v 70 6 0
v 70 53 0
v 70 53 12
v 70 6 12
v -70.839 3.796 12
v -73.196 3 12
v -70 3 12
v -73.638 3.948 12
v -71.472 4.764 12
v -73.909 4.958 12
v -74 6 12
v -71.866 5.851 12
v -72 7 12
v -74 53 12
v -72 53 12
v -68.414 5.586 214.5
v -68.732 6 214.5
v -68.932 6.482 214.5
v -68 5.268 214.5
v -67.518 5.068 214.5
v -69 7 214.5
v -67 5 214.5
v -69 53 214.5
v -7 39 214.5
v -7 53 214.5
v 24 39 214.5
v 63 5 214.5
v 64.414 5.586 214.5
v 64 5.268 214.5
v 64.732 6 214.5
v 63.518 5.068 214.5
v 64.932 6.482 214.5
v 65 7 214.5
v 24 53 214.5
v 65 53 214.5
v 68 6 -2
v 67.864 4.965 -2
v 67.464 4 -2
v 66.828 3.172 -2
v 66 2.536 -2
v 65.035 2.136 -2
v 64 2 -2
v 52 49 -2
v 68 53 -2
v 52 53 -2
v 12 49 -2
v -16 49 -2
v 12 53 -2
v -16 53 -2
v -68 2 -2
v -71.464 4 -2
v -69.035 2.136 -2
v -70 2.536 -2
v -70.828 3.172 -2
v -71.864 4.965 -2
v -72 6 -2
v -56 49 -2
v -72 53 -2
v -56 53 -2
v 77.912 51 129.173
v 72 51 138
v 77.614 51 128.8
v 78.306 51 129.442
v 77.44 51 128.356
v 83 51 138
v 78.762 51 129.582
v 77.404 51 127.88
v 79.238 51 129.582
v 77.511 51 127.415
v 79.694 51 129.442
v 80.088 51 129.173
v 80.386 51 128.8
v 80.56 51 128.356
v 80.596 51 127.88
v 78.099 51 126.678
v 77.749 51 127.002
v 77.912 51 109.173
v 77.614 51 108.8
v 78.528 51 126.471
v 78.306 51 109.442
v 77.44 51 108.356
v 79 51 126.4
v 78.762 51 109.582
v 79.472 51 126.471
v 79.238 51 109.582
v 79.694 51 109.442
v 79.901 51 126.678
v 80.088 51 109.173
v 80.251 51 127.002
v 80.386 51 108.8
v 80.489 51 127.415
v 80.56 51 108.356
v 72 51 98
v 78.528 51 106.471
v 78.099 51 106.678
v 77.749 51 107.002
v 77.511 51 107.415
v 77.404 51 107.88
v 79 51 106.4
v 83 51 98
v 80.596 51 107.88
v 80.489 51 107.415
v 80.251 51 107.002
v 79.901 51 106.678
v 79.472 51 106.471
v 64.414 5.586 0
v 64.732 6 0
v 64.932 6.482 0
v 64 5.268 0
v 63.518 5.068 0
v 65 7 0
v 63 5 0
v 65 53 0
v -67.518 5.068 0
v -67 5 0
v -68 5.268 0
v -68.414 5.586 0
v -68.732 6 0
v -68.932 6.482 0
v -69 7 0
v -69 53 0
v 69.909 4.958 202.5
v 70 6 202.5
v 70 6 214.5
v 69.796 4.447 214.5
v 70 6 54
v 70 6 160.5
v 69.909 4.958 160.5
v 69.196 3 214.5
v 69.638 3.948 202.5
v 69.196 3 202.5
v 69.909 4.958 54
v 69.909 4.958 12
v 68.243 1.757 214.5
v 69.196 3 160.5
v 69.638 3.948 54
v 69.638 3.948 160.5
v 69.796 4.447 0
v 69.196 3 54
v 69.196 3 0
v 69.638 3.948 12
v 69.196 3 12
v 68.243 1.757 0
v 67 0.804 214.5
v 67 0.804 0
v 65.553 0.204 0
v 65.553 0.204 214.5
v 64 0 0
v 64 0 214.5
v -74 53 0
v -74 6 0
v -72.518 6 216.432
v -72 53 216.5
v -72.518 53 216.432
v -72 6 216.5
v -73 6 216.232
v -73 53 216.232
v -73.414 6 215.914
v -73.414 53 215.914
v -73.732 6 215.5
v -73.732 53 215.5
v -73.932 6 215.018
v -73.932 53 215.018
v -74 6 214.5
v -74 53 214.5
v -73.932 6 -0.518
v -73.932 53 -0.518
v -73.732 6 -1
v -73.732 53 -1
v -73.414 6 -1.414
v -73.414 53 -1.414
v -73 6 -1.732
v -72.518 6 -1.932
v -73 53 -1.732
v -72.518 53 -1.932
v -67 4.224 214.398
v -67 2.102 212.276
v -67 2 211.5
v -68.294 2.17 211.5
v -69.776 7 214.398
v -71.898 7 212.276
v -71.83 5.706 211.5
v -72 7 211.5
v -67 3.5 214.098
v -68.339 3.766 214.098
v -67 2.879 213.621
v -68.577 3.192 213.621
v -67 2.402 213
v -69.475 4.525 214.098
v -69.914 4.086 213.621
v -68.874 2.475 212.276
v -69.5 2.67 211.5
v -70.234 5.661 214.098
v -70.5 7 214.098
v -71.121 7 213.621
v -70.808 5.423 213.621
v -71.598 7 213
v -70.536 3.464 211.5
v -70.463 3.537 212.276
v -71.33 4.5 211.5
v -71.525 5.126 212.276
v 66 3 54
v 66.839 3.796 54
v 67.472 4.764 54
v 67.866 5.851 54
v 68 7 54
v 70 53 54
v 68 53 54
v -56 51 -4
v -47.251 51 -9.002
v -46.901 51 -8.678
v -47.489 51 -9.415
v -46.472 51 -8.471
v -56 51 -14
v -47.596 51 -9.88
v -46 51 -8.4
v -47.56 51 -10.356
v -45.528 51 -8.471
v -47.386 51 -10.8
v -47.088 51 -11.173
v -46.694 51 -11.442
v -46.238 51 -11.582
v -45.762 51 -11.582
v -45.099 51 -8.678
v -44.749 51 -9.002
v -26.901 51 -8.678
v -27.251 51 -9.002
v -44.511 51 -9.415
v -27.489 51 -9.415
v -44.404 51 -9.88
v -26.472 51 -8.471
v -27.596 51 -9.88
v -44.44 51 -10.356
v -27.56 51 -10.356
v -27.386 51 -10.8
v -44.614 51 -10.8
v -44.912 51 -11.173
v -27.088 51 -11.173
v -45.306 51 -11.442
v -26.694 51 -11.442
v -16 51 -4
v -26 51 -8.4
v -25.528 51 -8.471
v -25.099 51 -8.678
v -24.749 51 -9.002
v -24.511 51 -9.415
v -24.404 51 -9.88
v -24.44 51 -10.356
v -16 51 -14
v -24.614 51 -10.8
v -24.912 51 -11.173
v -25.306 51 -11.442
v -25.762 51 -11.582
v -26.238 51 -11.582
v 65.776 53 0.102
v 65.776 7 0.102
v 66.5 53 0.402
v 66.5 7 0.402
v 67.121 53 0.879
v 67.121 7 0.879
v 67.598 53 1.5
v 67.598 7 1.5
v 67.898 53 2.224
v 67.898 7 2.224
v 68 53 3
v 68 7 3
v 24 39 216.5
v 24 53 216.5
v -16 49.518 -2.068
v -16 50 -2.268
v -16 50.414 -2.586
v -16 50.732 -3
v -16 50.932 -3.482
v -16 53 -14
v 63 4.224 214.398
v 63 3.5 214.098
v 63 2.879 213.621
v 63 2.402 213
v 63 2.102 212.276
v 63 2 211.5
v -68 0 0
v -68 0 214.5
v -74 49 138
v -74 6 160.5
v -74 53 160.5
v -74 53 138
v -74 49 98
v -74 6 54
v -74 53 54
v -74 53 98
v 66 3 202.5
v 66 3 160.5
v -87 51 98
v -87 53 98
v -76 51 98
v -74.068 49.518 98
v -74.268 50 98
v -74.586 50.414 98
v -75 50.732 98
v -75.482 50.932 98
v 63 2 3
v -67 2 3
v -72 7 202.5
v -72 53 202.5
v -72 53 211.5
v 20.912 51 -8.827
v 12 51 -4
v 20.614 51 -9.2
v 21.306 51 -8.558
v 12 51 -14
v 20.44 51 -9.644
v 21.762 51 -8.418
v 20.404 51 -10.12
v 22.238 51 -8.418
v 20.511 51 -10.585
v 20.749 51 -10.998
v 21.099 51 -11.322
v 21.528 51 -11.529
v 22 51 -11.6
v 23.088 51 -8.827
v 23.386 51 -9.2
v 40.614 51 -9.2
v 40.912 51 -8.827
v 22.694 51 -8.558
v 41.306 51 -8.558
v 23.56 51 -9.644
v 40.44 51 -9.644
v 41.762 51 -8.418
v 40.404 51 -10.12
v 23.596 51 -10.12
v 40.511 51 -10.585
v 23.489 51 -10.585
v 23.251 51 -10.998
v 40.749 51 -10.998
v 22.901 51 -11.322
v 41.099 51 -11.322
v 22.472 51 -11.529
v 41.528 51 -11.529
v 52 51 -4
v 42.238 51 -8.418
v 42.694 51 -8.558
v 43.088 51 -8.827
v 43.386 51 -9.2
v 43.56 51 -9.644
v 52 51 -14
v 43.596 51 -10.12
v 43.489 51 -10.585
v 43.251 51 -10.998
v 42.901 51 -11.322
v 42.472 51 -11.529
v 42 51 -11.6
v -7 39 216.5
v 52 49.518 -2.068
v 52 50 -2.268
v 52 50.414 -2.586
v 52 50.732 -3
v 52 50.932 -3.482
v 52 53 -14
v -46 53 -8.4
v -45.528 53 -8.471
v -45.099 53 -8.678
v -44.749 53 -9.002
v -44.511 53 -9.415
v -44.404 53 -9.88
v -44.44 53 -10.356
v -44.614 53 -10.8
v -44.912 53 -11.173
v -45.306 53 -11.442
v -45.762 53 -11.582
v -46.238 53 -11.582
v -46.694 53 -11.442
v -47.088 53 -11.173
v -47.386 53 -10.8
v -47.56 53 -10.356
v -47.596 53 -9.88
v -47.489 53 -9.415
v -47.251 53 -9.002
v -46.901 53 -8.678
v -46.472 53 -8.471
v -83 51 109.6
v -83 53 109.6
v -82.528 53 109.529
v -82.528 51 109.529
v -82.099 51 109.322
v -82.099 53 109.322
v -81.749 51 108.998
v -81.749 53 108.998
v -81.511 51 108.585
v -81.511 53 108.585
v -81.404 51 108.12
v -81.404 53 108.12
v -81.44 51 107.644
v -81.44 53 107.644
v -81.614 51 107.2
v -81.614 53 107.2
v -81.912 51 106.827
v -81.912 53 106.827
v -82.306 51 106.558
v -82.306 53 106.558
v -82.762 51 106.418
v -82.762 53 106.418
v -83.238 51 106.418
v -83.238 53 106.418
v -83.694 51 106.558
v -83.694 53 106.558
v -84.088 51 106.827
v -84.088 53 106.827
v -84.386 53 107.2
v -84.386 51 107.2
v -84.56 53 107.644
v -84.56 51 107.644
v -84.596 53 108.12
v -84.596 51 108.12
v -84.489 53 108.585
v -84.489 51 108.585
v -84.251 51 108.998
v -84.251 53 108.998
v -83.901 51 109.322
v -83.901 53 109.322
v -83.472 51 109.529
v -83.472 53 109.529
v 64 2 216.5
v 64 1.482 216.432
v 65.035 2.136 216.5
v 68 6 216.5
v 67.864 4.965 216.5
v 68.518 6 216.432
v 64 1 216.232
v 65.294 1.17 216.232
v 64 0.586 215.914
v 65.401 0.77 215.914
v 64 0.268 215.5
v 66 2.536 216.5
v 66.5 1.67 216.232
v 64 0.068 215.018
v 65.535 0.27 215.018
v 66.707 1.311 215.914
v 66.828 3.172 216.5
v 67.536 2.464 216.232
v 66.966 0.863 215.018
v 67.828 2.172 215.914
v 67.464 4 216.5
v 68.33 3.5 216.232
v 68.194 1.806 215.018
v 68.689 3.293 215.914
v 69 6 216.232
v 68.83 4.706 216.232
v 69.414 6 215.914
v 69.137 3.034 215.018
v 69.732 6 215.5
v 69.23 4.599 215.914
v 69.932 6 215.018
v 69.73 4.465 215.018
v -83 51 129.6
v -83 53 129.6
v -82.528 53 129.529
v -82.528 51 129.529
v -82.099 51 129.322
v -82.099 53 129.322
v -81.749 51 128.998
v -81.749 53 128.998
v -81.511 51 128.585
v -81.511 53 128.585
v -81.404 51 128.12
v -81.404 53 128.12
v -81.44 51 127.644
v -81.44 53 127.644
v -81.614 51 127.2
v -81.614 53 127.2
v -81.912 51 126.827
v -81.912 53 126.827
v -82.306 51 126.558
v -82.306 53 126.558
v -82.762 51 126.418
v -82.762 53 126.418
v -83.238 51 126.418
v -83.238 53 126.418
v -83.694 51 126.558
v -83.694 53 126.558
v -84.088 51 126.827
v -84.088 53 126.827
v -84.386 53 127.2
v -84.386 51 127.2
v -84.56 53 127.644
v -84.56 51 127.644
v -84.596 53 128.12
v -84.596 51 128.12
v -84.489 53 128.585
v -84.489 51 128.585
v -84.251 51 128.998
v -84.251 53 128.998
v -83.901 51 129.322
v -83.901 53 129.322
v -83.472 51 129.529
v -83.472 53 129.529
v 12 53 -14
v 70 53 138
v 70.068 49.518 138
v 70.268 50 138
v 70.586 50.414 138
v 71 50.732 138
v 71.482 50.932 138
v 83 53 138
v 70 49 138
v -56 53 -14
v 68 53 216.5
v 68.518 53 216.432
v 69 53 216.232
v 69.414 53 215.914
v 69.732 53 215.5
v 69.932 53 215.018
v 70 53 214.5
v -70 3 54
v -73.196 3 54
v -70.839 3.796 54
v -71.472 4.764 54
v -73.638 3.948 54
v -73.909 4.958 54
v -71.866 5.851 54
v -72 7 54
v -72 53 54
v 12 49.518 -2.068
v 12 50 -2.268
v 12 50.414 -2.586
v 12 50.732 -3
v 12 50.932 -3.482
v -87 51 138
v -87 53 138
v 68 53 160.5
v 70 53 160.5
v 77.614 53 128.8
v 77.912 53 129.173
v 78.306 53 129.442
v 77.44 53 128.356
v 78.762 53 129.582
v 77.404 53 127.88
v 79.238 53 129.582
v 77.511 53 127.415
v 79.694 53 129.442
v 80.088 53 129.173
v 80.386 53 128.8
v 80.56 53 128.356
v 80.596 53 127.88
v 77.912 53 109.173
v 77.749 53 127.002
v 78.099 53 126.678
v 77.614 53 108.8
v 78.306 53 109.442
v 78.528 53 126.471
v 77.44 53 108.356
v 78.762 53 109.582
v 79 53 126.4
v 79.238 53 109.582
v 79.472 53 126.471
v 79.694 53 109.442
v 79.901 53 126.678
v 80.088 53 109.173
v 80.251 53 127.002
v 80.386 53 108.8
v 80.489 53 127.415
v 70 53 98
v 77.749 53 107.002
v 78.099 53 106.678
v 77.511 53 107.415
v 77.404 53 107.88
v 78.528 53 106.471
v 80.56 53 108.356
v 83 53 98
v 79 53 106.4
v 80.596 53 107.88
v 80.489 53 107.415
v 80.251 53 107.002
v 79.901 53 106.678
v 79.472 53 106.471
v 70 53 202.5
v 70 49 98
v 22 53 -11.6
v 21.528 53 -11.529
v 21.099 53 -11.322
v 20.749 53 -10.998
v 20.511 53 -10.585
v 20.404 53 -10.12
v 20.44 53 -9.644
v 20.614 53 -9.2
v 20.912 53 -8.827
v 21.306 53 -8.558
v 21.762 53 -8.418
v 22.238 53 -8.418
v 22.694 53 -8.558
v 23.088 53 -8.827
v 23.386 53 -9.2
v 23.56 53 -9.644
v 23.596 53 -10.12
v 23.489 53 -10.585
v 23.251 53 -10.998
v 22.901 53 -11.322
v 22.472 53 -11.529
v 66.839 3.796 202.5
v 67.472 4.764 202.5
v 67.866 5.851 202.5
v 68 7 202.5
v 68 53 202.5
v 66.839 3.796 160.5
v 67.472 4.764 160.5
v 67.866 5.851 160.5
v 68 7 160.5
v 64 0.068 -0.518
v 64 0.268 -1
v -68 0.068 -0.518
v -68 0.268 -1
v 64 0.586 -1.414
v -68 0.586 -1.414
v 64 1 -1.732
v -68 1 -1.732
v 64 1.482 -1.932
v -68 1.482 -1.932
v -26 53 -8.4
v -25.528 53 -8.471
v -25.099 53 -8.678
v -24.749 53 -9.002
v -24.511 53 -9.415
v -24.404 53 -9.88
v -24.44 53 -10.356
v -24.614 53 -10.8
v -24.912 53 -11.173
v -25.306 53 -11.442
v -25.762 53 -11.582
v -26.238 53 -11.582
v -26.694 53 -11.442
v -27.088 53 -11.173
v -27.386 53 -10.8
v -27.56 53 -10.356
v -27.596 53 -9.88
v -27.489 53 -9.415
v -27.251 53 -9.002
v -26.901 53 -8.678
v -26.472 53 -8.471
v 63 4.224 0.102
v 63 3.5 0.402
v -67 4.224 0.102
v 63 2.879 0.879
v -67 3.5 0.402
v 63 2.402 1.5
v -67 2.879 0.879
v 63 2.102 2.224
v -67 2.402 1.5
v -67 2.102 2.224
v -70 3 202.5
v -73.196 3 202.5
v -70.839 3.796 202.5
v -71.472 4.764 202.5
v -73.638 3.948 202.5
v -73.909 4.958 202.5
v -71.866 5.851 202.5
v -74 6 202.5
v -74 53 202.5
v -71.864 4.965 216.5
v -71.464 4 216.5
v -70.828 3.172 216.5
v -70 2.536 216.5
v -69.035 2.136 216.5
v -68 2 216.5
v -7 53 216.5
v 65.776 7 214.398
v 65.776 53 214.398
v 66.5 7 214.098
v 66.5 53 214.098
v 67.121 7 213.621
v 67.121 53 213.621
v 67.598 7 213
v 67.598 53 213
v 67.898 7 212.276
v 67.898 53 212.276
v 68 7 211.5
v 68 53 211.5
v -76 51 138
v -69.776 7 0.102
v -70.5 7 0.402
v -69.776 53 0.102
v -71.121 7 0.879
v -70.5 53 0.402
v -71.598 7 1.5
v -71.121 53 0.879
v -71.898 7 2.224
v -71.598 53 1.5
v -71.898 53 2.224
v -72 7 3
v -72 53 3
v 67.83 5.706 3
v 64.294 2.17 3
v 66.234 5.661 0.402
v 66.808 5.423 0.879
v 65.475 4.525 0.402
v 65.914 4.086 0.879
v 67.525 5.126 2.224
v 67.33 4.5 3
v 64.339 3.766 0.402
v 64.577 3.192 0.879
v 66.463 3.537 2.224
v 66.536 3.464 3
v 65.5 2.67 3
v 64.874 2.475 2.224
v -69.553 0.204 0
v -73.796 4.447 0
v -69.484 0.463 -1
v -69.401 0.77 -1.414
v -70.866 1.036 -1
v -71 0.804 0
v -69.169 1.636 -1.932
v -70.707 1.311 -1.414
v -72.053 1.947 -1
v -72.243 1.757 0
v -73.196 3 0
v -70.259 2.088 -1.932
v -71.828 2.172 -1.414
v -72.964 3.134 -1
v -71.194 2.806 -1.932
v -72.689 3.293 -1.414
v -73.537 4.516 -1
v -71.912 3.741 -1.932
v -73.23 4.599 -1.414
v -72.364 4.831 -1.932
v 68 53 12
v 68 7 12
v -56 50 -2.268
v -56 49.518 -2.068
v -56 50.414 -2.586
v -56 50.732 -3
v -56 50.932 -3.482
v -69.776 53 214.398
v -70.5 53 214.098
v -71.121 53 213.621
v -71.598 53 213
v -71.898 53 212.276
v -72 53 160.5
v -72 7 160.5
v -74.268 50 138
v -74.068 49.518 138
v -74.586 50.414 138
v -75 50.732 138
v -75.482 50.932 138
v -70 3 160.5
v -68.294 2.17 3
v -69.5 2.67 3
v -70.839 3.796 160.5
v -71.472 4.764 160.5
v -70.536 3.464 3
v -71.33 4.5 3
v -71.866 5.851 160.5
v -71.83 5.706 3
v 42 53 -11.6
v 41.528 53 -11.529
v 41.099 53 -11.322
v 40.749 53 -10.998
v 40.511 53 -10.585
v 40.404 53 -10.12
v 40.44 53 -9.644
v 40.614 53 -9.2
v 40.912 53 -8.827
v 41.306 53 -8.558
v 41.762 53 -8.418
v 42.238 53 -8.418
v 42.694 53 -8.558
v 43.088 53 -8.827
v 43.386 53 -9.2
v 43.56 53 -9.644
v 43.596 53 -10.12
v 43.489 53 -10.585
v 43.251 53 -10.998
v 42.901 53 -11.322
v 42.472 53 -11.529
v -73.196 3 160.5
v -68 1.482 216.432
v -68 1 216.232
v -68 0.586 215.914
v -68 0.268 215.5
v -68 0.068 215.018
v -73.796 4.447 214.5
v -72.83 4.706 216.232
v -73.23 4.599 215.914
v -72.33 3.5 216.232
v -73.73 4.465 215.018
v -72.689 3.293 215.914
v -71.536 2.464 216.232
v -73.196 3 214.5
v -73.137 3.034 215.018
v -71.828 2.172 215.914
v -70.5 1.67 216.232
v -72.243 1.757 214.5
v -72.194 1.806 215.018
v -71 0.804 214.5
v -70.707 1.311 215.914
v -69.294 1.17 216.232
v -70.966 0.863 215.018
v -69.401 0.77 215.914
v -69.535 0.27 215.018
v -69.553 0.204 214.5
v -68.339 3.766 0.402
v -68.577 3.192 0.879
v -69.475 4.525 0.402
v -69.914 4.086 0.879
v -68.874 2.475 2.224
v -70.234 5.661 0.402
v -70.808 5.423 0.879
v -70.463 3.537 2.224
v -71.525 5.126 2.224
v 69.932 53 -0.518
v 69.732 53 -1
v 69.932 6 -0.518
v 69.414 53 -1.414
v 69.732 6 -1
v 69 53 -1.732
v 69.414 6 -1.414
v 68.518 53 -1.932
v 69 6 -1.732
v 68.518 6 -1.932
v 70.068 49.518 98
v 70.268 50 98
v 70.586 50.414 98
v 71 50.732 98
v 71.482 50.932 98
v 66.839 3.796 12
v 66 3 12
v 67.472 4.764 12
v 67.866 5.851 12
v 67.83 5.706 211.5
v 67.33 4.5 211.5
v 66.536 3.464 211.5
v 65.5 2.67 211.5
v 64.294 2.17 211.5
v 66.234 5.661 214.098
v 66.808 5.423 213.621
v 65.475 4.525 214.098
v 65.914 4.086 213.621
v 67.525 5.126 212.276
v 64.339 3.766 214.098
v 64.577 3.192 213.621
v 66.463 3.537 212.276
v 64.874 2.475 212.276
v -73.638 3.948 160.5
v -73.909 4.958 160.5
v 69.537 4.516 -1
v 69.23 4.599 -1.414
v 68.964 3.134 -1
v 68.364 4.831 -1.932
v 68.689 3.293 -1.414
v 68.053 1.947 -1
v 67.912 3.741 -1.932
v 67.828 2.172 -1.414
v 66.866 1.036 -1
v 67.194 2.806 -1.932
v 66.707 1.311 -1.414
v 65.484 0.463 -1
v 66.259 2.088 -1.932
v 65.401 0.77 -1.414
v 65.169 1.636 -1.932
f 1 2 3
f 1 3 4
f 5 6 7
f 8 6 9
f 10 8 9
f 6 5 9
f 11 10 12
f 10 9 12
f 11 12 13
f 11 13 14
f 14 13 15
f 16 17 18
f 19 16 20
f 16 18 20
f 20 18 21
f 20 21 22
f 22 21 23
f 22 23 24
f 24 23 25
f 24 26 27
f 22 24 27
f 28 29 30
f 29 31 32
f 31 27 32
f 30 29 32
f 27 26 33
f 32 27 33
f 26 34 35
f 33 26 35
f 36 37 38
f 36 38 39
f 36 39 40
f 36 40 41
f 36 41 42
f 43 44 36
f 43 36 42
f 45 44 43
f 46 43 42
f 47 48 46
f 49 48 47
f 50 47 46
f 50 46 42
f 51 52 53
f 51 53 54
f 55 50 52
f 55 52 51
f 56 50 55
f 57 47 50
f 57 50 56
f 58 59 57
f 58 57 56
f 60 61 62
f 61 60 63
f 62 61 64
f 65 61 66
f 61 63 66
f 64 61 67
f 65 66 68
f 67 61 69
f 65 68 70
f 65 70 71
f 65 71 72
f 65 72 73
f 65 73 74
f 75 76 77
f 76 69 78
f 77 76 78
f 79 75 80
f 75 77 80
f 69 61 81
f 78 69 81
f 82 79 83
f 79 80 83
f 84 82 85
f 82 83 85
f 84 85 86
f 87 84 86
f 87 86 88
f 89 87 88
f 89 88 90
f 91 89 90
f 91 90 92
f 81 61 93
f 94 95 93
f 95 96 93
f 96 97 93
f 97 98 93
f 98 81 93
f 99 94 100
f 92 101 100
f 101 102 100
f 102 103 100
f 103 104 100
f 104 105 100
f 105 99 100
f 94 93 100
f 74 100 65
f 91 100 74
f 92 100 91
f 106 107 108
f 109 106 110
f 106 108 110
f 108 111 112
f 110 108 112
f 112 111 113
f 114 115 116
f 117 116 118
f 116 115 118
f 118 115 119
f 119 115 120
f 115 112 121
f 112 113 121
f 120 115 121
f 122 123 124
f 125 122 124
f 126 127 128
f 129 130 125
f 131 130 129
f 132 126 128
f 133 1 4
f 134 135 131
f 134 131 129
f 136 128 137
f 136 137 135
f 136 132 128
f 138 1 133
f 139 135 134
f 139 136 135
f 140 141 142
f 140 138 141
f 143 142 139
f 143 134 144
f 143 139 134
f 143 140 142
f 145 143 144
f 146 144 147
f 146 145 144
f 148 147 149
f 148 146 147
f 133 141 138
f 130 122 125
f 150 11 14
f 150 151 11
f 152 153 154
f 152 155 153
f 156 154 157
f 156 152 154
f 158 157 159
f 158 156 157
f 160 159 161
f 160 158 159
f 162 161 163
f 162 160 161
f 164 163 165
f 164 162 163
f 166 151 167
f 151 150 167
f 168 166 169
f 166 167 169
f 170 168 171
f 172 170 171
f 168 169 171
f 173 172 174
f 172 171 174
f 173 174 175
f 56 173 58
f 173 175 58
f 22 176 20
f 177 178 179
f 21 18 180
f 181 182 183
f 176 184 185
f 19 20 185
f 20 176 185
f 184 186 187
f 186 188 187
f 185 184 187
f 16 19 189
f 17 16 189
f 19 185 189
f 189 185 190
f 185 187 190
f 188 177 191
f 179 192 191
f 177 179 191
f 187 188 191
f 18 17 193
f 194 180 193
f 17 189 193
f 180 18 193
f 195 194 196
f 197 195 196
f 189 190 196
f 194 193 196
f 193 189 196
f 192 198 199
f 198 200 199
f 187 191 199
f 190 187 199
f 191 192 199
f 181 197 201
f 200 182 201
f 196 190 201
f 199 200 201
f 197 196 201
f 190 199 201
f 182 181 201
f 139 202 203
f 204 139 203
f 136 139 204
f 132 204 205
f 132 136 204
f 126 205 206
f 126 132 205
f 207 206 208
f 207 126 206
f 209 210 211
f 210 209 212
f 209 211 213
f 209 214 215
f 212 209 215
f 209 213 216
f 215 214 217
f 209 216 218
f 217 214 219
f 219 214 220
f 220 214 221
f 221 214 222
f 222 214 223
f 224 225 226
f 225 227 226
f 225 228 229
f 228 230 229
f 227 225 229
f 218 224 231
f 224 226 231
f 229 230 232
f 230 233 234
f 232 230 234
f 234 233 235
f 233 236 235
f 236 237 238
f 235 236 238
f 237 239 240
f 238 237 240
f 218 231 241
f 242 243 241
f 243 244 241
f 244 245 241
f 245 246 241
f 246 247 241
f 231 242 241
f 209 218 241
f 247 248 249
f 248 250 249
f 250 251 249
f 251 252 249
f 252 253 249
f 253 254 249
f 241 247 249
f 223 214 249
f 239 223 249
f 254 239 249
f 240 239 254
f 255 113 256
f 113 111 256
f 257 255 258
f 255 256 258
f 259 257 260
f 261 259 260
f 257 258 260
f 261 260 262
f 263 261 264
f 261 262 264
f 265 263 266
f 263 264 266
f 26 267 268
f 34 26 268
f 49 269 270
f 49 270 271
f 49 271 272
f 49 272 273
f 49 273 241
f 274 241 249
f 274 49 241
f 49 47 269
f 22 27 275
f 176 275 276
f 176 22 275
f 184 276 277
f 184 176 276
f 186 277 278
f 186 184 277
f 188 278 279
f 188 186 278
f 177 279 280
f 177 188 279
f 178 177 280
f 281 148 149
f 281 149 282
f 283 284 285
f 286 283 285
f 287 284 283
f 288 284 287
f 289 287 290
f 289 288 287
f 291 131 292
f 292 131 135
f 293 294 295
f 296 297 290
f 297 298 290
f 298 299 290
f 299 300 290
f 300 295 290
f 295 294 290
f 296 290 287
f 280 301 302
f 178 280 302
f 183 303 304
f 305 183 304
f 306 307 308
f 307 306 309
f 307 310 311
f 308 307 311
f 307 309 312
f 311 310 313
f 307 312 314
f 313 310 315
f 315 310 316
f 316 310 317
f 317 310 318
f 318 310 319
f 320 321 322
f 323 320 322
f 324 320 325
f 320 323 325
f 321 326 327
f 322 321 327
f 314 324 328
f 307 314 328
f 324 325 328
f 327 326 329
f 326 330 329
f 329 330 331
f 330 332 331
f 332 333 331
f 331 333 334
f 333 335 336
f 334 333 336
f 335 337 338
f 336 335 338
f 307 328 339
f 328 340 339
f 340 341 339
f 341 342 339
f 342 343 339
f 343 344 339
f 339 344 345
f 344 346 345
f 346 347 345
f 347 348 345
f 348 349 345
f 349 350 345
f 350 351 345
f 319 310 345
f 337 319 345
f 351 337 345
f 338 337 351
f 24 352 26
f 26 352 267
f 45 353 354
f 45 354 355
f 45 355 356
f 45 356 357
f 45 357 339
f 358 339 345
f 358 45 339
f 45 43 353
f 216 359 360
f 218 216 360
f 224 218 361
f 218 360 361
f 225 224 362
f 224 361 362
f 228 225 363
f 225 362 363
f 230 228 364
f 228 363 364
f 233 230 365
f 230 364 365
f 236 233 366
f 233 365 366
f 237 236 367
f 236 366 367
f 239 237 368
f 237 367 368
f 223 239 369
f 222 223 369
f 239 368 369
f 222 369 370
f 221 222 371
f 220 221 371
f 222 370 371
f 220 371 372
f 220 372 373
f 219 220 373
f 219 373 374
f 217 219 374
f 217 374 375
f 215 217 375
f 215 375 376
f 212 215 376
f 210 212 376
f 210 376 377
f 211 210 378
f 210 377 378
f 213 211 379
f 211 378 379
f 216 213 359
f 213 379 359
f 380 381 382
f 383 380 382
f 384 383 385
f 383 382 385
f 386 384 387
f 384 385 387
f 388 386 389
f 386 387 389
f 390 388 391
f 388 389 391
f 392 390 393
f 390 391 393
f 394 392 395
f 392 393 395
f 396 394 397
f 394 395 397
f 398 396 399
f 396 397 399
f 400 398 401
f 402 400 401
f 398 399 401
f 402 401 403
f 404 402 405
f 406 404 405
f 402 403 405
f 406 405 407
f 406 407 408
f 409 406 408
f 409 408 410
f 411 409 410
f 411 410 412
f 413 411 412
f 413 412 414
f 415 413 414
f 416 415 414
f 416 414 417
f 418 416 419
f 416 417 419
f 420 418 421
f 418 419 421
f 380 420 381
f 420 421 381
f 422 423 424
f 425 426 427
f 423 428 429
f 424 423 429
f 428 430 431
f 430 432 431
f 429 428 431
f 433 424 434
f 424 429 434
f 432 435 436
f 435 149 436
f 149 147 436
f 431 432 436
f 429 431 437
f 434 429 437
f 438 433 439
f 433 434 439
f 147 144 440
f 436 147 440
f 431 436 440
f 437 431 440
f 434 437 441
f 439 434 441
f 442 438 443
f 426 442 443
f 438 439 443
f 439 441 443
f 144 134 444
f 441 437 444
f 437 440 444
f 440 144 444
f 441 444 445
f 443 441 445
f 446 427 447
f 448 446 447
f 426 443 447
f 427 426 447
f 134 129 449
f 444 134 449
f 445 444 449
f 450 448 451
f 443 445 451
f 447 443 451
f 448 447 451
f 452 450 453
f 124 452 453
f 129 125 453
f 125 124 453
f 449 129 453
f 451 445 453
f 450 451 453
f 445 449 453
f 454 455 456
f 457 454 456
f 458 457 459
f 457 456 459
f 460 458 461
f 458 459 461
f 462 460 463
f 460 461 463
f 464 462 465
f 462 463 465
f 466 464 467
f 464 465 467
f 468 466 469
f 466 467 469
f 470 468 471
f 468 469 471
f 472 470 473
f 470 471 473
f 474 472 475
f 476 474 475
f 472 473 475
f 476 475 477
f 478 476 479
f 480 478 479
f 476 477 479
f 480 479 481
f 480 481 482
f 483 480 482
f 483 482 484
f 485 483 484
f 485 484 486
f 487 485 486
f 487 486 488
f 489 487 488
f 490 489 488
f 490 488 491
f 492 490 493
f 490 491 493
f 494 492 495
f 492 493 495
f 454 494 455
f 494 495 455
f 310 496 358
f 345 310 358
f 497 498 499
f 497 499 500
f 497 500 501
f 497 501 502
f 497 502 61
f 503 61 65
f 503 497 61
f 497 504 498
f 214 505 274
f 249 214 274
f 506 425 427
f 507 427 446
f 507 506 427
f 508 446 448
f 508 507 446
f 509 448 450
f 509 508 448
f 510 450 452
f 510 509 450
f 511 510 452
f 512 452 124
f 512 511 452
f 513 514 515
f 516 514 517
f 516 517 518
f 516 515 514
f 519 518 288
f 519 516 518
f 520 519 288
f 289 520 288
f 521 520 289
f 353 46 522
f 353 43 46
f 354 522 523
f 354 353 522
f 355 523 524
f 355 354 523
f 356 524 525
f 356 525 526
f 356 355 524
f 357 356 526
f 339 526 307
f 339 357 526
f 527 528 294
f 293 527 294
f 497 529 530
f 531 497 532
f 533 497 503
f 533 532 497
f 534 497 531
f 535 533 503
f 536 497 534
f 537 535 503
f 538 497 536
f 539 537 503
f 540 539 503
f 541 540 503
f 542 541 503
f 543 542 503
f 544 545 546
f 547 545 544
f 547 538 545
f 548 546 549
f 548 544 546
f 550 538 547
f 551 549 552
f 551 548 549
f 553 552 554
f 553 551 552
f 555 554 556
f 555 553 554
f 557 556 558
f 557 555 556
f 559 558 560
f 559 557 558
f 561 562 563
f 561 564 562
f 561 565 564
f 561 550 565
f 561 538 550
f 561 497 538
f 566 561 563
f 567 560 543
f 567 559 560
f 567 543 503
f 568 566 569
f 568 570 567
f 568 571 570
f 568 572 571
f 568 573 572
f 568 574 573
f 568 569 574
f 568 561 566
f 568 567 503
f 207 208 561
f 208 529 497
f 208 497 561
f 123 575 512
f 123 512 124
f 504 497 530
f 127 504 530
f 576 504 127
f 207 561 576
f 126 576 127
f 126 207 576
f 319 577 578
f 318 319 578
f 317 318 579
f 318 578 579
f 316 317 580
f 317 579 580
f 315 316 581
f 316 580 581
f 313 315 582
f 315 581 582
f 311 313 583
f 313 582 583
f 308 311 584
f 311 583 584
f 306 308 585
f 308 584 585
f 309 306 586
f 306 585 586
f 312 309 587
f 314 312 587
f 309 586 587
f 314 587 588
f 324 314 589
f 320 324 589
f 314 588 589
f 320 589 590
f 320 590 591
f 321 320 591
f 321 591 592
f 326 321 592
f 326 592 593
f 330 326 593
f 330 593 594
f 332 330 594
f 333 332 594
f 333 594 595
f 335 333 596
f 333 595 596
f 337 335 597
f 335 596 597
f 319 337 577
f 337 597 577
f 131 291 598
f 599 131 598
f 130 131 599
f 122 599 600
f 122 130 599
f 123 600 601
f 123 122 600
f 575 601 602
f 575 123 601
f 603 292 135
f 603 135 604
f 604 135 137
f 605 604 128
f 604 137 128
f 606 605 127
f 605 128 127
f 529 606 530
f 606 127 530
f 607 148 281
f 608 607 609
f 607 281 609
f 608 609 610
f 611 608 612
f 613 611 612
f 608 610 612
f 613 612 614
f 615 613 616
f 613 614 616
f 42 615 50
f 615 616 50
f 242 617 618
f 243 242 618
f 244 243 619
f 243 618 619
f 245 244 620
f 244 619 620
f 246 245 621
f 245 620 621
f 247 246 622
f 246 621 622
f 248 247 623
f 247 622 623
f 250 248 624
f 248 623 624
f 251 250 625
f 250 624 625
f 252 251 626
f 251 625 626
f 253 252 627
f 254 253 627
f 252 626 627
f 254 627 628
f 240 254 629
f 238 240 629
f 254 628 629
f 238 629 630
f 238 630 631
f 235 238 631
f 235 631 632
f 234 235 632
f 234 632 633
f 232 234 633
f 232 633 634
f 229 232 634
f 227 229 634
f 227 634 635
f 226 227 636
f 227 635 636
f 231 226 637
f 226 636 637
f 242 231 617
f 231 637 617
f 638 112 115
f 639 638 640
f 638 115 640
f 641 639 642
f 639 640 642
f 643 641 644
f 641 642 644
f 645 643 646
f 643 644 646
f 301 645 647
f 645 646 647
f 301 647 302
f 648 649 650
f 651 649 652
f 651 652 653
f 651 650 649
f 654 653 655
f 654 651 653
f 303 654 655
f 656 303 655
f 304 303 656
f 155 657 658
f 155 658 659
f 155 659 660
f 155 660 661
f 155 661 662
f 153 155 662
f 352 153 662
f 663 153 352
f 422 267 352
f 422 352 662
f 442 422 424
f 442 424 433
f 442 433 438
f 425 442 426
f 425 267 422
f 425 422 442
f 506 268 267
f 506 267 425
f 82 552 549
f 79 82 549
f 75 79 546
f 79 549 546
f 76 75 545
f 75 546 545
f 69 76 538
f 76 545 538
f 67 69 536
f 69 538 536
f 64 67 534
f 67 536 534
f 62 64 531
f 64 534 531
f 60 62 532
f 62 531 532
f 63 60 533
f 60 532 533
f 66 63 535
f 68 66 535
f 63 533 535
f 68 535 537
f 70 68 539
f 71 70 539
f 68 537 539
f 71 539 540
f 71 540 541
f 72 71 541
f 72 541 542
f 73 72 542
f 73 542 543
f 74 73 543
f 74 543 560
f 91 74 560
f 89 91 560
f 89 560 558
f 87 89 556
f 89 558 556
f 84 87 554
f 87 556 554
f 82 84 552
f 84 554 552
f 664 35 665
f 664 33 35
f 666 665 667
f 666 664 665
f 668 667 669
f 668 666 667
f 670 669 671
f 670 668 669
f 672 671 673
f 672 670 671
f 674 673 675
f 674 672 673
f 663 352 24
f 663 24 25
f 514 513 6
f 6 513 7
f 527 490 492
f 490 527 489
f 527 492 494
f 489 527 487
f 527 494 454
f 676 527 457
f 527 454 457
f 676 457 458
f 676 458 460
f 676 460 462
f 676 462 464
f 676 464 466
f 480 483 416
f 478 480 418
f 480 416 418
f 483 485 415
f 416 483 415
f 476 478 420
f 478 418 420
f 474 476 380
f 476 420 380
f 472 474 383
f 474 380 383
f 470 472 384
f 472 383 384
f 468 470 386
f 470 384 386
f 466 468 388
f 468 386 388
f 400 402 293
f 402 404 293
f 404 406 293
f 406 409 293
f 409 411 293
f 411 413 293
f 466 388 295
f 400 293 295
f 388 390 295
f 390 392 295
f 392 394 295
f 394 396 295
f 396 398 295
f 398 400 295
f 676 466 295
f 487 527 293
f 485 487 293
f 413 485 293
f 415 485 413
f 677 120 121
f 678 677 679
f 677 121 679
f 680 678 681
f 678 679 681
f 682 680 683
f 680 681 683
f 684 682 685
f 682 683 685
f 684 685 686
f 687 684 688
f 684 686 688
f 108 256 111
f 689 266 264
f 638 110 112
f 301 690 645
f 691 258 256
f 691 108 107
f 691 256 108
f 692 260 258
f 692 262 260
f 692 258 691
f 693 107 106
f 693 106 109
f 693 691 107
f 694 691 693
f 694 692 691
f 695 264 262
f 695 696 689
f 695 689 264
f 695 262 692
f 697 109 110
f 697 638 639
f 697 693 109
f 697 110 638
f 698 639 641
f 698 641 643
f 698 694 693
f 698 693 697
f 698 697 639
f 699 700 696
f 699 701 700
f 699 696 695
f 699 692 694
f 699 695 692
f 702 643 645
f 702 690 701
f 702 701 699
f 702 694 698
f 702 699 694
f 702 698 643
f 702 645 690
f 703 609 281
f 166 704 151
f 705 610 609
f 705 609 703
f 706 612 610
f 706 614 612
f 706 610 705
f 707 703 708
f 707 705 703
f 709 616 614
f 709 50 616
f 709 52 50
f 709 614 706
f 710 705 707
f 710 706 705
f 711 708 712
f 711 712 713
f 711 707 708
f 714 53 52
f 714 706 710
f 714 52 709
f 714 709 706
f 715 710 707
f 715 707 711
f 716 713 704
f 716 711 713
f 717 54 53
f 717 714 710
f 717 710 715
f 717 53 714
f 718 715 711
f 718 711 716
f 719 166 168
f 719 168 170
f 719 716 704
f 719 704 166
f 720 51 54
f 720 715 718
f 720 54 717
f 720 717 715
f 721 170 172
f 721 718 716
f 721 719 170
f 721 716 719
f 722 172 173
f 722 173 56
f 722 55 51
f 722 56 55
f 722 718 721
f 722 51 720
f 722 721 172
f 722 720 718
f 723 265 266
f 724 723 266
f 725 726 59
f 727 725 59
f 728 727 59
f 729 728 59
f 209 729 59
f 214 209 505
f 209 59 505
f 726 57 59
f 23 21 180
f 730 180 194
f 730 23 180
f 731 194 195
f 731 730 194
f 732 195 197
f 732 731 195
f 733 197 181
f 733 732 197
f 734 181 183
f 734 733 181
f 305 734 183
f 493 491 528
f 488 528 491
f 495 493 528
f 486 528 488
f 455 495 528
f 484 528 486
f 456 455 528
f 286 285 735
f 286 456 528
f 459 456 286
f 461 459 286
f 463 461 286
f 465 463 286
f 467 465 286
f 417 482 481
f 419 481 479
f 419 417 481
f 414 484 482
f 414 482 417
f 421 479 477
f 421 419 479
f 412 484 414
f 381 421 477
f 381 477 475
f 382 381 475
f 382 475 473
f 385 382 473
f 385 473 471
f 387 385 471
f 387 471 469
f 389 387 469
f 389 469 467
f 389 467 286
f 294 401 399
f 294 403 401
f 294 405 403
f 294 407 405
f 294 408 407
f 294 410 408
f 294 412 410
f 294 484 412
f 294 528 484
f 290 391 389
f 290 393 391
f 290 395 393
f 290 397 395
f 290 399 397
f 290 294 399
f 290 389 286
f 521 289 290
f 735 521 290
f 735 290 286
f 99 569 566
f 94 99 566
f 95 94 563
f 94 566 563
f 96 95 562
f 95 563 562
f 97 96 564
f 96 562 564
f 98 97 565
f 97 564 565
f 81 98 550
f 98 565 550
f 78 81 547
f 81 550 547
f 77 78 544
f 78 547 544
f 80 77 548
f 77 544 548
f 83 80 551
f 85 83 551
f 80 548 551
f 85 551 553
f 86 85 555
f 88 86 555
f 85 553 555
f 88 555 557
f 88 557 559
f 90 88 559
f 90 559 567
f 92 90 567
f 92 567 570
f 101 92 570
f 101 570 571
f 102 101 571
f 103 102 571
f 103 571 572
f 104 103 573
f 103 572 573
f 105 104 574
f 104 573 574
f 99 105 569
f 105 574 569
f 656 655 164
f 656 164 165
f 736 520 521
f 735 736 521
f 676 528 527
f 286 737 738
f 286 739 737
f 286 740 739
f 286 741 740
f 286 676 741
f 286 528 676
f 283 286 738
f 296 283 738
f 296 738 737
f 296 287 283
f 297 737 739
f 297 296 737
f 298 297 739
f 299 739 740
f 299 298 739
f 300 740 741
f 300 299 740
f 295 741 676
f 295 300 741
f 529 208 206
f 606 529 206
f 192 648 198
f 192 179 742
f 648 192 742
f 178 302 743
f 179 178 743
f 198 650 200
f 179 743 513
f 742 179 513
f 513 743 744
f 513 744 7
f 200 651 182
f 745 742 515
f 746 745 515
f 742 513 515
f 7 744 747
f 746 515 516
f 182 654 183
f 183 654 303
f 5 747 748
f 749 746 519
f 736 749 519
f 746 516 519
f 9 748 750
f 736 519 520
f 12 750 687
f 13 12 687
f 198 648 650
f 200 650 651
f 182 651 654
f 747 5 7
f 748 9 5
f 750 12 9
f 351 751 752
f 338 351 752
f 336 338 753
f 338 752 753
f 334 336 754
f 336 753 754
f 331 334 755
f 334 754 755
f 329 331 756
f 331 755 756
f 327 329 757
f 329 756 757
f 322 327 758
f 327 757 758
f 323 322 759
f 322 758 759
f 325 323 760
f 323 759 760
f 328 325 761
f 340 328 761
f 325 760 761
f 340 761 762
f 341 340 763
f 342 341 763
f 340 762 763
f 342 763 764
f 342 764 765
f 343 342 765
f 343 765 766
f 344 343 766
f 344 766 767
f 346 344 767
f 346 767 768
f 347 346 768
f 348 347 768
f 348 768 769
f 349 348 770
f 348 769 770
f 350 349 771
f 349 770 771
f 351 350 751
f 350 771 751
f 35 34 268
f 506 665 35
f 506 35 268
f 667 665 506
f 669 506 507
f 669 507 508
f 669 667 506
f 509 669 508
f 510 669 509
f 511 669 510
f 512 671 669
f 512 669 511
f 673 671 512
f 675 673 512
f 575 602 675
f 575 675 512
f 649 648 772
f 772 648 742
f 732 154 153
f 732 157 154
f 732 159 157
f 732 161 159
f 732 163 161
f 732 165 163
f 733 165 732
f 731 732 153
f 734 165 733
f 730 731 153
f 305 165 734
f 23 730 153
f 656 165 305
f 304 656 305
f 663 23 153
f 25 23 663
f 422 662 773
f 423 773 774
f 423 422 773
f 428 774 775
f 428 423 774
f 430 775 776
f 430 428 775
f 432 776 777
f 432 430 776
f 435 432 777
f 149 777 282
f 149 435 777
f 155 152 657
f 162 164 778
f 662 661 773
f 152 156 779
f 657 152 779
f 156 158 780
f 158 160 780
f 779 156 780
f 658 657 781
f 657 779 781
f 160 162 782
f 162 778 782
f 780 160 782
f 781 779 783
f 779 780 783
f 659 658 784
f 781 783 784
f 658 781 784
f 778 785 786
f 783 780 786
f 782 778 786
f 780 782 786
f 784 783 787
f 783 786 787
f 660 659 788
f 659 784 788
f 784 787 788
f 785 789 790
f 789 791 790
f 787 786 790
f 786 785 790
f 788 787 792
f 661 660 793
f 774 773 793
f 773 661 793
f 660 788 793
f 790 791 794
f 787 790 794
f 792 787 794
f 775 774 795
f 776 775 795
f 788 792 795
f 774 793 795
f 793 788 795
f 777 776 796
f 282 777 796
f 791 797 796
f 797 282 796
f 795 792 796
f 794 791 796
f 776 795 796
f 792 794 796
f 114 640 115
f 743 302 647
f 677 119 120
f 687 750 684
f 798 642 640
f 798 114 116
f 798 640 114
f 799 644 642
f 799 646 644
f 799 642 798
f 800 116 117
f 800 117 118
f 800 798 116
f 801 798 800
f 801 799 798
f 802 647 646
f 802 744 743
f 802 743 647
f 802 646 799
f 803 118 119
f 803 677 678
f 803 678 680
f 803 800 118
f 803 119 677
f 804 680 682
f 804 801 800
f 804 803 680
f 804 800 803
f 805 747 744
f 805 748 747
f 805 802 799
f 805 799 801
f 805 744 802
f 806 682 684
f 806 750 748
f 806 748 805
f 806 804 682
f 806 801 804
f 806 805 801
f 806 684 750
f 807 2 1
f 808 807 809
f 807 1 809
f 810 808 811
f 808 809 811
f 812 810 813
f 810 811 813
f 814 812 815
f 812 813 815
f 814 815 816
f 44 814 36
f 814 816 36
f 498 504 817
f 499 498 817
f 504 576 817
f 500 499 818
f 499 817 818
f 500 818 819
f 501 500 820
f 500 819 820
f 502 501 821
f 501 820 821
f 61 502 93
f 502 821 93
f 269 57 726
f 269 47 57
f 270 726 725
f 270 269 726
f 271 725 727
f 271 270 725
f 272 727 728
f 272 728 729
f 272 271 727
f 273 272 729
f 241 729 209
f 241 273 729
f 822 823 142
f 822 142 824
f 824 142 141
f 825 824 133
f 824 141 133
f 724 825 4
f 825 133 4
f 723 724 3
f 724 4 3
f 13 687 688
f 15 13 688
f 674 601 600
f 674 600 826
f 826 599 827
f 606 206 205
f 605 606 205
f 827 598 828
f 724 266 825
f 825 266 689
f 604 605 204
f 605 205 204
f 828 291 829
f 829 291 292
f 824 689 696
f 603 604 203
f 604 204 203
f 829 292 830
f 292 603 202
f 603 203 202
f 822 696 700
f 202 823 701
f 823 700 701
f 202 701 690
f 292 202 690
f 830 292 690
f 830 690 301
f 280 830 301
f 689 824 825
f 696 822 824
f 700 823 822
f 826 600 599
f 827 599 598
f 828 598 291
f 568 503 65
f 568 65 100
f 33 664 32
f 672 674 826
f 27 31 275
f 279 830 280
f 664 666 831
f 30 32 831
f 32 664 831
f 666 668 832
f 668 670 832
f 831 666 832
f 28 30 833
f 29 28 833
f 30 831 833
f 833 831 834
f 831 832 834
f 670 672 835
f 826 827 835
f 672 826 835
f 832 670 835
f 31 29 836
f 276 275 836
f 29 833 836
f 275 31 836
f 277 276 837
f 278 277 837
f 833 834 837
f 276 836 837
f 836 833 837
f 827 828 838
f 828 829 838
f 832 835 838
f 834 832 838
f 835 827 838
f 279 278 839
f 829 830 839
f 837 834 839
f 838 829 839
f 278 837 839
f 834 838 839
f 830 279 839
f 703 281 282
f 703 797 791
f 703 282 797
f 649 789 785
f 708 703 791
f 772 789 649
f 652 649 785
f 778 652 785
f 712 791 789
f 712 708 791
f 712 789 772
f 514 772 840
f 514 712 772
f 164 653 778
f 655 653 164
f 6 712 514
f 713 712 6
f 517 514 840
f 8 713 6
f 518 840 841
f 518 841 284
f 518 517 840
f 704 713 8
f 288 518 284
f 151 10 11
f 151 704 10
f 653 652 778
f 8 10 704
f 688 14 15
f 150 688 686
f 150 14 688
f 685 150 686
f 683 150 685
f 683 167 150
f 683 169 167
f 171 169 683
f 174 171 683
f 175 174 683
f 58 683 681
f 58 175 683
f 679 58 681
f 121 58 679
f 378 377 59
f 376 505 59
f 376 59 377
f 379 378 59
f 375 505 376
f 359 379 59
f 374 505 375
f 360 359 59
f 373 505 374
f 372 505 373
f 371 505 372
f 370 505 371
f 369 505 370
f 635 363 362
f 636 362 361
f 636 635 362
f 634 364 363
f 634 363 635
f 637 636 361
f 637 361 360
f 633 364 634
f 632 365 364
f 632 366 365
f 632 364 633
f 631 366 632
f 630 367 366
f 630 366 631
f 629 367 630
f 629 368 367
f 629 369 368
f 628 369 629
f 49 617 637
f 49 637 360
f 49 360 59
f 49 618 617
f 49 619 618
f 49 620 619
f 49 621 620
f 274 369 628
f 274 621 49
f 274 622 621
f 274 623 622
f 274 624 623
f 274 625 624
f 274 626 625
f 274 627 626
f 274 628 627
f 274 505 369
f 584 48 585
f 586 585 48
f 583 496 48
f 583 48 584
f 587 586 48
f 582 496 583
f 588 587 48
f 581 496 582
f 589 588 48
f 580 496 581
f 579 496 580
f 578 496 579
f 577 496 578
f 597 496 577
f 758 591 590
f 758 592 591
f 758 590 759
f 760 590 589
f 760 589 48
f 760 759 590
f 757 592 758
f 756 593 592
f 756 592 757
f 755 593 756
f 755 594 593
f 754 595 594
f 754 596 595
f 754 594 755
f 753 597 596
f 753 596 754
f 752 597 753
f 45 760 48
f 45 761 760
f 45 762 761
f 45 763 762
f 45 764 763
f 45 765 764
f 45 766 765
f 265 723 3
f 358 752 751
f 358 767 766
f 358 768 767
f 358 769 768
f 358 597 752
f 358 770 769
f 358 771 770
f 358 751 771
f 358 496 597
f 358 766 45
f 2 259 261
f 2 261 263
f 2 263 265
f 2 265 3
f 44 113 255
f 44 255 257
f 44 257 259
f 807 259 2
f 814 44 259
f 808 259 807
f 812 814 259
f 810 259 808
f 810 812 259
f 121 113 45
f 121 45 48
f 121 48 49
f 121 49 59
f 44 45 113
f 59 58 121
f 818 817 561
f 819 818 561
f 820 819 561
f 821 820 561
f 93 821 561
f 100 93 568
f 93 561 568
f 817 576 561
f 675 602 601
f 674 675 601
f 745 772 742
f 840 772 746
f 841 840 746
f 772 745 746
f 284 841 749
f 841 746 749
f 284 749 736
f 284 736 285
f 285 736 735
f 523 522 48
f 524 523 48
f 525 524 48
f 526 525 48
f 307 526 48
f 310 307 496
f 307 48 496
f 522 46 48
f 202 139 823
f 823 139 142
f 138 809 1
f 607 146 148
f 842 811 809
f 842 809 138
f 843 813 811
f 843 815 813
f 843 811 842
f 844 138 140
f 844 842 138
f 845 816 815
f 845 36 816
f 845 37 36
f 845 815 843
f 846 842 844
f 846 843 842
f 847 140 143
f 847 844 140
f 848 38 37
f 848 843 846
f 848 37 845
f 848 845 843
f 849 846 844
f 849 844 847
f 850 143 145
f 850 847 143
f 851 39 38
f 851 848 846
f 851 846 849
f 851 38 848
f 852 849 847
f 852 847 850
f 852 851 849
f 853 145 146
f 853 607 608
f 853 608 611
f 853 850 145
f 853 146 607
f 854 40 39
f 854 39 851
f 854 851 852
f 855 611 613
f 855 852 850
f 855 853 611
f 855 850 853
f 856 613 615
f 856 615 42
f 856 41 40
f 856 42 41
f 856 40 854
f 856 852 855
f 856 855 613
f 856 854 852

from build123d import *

# Parameters (mm, degrees)
EXTRUDE_1_DEPTH     = 214.5
EXTRUDE_2_DEPTH     = 2
EXTRUDE_START       = 2
EXTRUDE_3_DEPTH     = 2
FILLET_2_R          = 3
FILLET_3_R          = 3
SKETCH_6_W          = 40
SKETCH_6_H          = 12
SKETCH_6_R          = 1.6
SKETCH_6_W_2        = 13
SKETCH_6_H_2        = 40
EXTRUDE_4_DEPTH     = 2
SKETCH_8_W          = 31
SKETCH_8_H          = 14
CUT_EXTRUDE_2_DEPTH = 10
FILLET_4_R          = 2
FILLET_5_R          = 2
SKETCH_9_W          = 42
SKETCH_9_H          = 50
CUT_EXTRUDE_3_DEPTH = 273.635746006
SKETCH_10_W         = 42
SKETCH_10_H         = 50
CUT_EXTRUDE_4_DEPTH = 273.635746006


with BuildPart() as part:
    # 草图1 → 凸台-拉伸1 (new body)
    with BuildSketch(Plane.XY):
        with BuildLine():
            Line((-68, 0), (64, 0))
            ThreePointArc((64, 0), (68.242640687, 1.757359313), (70, 6))
            Line((70, 6), (70, 53))
            Line((70, 53), (68, 53))
            Line((68, 53), (68, 7))
            ThreePointArc((68, 7), (66.535533906, 3.464466094), (63, 2))
            Line((63, 2), (-67, 2))
            ThreePointArc((-67, 2), (-70.535533906, 3.464466094), (-72, 7))
            Line((-72, 7), (-72, 53))
            Line((-72, 53), (-74, 53))
            Line((-74, 53), (-74, 6))
            ThreePointArc((-74, 6), (-72.242640687, 1.757359313), (-68, 0))
        make_face()
    extrude(amount=EXTRUDE_1_DEPTH)

    # 草图2 → 凸台-拉伸2 (add)
    with BuildSketch(Plane.XY.offset(214.5)):
        with BuildLine():
            Line((-68, 0), (64, 0))
            ThreePointArc((64, 0), (68.242640687, 1.757359313), (70, 6))
            Line((70, 6), (70, 53))
            Line((70, 53), (-74, 53))
            Line((-74, 53), (-74, 6))
            ThreePointArc((-74, 6), (-72.242640687, 1.757359313), (-68, 0))
        make_face()
    extrude(amount=EXTRUDE_2_DEPTH)

    # 草图3 → 凸台-拉伸3 (add)
    with BuildSketch(Plane(origin=(0, 0, 0), x_dir=(-1, 0, 0), z_dir=(0, 0, -1)).offset(EXTRUDE_START)):
        with BuildLine():
            Line((-64, 0), (68, 0))
            ThreePointArc((68, 0), (72.242640687, 1.757359313), (74, 6))
            Line((74, 6), (74, 53))
            Line((74, 53), (-70, 53))
            Line((-70, 53), (-70, 6))
            ThreePointArc((-70, 6), (-68.242640687, 1.757359313), (-64, 0))
        make_face()
    extrude(amount=-EXTRUDE_3_DEPTH)

    # 圆角2
    fillet_2_edges = [part.edges().sort_by_distance(p)[0] for p in [
        (68, 30, 214.5),
        (66.535533906, 3.464466094, 214.5),
        (-2, 2, 214.5),
        (-70.535533906, 3.464466094, 214.5),
        (-72, 30, 214.5),
    ]]
    fillet(fillet_2_edges, radius=FILLET_2_R)

    # 圆角3
    fillet_3_edges = [part.edges().sort_by_distance(p)[0] for p in [
        (-72, 30, 0),
        (-70.535533906, 3.464466094, 0),
        (-2, 2, 0),
        (66.535533906, 3.464466094, 0),
        (68, 30, 0),
    ]]
    fillet(fillet_3_edges, radius=FILLET_3_R)

    # 草图6 → 凸台-拉伸4 (add)
    # profile 1 of 4: a face of its own
    with BuildSketch(Plane(origin=(0, 53, 0), x_dir=(1, 0, 0), z_dir=(0, 1, 0))):
        with Locations((-36, 8)):
            Rectangle(SKETCH_6_W, SKETCH_6_H)
        with Locations(Location((-46, 10, 0), (0, 0, 270))):
            Circle(SKETCH_6_R, mode=Mode.SUBTRACT)
        with Locations(Location((-26, 10, 0), (0, 0, 270))):
            Circle(SKETCH_6_R, mode=Mode.SUBTRACT)
    # profile 2 of 4: a face of its own
    with BuildSketch(Plane(origin=(0, 53, 0), x_dir=(1, 0, 0), z_dir=(0, 1, 0))):
        with Locations((-80.5, -118)):
            Rectangle(SKETCH_6_W_2, SKETCH_6_H_2)
        with Locations(Location((-83, -108, 0), (0, 0, 270))):
            Circle(SKETCH_6_R, mode=Mode.SUBTRACT)
        with Locations(Location((-83, -128, 0), (0, 0, 270))):
            Circle(SKETCH_6_R, mode=Mode.SUBTRACT)
    # profile 3 of 4: a face of its own
    with BuildSketch(Plane(origin=(0, 53, 0), x_dir=(1, 0, 0), z_dir=(0, 1, 0))):
        with Locations((76.5, -118)):
            Rectangle(SKETCH_6_W_2, SKETCH_6_H_2)
        with Locations(Location((79, -128, 0), (0, 0, 90))):
            Circle(SKETCH_6_R, mode=Mode.SUBTRACT)
        with Locations(Location((79, -108, 0), (0, 0, 90))):
            Circle(SKETCH_6_R, mode=Mode.SUBTRACT)
    # profile 4 of 4: a face of its own
    with BuildSketch(Plane(origin=(0, 53, 0), x_dir=(1, 0, 0), z_dir=(0, 1, 0))):
        with Locations((32, 8)):
            Rectangle(SKETCH_6_W, SKETCH_6_H)
        with Locations(Location((42, 10, 0), (0, 0, 90))):
            Circle(SKETCH_6_R, mode=Mode.SUBTRACT)
        with Locations(Location((22, 10, 0), (0, 0, 90))):
            Circle(SKETCH_6_R, mode=Mode.SUBTRACT)
    extrude(amount=-EXTRUDE_4_DEPTH)

    # 草图8 → 切除-拉伸2 (cut)
    with BuildSketch(Plane.XY.offset(216.5)):
        with Locations((8.5, 46)):
            Rectangle(SKETCH_8_W, SKETCH_8_H)
    extrude(amount=-CUT_EXTRUDE_2_DEPTH, mode=Mode.SUBTRACT)

    # 圆角4
    fillet_4_edges = [part.edges().sort_by_distance(p)[0] for p in [
        (-36, 51, -2),
        (32, 51, -2),
        (-74, 51, 118),
        (70, 51, 118),
    ]]
    fillet(fillet_4_edges, radius=FILLET_4_R)

    # 圆角5
    fillet_5_edges = [part.edges().sort_by_distance(p)[0] for p in [
        (70, 29.5, 216.5),
        (-74, 29.5, 216.5),
        (-72.242640687, 1.757359313, 216.5),
        (-2, 0, 216.5),
        (68.242640687, 1.757359313, 216.5),
        (-74, 29.5, -2),
        (70, 29.5, -2),
        (68.242640687, 1.757359313, -2),
        (-2, 0, -2),
        (-72.242640687, 1.757359313, -2),
    ]]
    fillet(fillet_5_edges, radius=FILLET_5_R)

    # 草图9 → 切除-拉伸3 (cut, through all)
    with BuildSketch(Plane(origin=(70, 0, 0), x_dir=(0, 0, -1), z_dir=(1, 0, 0))):
        with Locations((-181.5, 28)):
            Rectangle(SKETCH_9_W, SKETCH_9_H)
    extrude(amount=-CUT_EXTRUDE_3_DEPTH, mode=Mode.SUBTRACT)

    # 草图10 → 切除-拉伸4 (cut, through all)
    with BuildSketch(Plane(origin=(70, 0, 0), x_dir=(0, 0, -1), z_dir=(1, 0, 0))):
        with Locations((-33, 28)):
            Rectangle(SKETCH_10_W, SKETCH_10_H)
    extrude(amount=-CUT_EXTRUDE_4_DEPTH, mode=Mode.SUBTRACT)


solid = part.part
